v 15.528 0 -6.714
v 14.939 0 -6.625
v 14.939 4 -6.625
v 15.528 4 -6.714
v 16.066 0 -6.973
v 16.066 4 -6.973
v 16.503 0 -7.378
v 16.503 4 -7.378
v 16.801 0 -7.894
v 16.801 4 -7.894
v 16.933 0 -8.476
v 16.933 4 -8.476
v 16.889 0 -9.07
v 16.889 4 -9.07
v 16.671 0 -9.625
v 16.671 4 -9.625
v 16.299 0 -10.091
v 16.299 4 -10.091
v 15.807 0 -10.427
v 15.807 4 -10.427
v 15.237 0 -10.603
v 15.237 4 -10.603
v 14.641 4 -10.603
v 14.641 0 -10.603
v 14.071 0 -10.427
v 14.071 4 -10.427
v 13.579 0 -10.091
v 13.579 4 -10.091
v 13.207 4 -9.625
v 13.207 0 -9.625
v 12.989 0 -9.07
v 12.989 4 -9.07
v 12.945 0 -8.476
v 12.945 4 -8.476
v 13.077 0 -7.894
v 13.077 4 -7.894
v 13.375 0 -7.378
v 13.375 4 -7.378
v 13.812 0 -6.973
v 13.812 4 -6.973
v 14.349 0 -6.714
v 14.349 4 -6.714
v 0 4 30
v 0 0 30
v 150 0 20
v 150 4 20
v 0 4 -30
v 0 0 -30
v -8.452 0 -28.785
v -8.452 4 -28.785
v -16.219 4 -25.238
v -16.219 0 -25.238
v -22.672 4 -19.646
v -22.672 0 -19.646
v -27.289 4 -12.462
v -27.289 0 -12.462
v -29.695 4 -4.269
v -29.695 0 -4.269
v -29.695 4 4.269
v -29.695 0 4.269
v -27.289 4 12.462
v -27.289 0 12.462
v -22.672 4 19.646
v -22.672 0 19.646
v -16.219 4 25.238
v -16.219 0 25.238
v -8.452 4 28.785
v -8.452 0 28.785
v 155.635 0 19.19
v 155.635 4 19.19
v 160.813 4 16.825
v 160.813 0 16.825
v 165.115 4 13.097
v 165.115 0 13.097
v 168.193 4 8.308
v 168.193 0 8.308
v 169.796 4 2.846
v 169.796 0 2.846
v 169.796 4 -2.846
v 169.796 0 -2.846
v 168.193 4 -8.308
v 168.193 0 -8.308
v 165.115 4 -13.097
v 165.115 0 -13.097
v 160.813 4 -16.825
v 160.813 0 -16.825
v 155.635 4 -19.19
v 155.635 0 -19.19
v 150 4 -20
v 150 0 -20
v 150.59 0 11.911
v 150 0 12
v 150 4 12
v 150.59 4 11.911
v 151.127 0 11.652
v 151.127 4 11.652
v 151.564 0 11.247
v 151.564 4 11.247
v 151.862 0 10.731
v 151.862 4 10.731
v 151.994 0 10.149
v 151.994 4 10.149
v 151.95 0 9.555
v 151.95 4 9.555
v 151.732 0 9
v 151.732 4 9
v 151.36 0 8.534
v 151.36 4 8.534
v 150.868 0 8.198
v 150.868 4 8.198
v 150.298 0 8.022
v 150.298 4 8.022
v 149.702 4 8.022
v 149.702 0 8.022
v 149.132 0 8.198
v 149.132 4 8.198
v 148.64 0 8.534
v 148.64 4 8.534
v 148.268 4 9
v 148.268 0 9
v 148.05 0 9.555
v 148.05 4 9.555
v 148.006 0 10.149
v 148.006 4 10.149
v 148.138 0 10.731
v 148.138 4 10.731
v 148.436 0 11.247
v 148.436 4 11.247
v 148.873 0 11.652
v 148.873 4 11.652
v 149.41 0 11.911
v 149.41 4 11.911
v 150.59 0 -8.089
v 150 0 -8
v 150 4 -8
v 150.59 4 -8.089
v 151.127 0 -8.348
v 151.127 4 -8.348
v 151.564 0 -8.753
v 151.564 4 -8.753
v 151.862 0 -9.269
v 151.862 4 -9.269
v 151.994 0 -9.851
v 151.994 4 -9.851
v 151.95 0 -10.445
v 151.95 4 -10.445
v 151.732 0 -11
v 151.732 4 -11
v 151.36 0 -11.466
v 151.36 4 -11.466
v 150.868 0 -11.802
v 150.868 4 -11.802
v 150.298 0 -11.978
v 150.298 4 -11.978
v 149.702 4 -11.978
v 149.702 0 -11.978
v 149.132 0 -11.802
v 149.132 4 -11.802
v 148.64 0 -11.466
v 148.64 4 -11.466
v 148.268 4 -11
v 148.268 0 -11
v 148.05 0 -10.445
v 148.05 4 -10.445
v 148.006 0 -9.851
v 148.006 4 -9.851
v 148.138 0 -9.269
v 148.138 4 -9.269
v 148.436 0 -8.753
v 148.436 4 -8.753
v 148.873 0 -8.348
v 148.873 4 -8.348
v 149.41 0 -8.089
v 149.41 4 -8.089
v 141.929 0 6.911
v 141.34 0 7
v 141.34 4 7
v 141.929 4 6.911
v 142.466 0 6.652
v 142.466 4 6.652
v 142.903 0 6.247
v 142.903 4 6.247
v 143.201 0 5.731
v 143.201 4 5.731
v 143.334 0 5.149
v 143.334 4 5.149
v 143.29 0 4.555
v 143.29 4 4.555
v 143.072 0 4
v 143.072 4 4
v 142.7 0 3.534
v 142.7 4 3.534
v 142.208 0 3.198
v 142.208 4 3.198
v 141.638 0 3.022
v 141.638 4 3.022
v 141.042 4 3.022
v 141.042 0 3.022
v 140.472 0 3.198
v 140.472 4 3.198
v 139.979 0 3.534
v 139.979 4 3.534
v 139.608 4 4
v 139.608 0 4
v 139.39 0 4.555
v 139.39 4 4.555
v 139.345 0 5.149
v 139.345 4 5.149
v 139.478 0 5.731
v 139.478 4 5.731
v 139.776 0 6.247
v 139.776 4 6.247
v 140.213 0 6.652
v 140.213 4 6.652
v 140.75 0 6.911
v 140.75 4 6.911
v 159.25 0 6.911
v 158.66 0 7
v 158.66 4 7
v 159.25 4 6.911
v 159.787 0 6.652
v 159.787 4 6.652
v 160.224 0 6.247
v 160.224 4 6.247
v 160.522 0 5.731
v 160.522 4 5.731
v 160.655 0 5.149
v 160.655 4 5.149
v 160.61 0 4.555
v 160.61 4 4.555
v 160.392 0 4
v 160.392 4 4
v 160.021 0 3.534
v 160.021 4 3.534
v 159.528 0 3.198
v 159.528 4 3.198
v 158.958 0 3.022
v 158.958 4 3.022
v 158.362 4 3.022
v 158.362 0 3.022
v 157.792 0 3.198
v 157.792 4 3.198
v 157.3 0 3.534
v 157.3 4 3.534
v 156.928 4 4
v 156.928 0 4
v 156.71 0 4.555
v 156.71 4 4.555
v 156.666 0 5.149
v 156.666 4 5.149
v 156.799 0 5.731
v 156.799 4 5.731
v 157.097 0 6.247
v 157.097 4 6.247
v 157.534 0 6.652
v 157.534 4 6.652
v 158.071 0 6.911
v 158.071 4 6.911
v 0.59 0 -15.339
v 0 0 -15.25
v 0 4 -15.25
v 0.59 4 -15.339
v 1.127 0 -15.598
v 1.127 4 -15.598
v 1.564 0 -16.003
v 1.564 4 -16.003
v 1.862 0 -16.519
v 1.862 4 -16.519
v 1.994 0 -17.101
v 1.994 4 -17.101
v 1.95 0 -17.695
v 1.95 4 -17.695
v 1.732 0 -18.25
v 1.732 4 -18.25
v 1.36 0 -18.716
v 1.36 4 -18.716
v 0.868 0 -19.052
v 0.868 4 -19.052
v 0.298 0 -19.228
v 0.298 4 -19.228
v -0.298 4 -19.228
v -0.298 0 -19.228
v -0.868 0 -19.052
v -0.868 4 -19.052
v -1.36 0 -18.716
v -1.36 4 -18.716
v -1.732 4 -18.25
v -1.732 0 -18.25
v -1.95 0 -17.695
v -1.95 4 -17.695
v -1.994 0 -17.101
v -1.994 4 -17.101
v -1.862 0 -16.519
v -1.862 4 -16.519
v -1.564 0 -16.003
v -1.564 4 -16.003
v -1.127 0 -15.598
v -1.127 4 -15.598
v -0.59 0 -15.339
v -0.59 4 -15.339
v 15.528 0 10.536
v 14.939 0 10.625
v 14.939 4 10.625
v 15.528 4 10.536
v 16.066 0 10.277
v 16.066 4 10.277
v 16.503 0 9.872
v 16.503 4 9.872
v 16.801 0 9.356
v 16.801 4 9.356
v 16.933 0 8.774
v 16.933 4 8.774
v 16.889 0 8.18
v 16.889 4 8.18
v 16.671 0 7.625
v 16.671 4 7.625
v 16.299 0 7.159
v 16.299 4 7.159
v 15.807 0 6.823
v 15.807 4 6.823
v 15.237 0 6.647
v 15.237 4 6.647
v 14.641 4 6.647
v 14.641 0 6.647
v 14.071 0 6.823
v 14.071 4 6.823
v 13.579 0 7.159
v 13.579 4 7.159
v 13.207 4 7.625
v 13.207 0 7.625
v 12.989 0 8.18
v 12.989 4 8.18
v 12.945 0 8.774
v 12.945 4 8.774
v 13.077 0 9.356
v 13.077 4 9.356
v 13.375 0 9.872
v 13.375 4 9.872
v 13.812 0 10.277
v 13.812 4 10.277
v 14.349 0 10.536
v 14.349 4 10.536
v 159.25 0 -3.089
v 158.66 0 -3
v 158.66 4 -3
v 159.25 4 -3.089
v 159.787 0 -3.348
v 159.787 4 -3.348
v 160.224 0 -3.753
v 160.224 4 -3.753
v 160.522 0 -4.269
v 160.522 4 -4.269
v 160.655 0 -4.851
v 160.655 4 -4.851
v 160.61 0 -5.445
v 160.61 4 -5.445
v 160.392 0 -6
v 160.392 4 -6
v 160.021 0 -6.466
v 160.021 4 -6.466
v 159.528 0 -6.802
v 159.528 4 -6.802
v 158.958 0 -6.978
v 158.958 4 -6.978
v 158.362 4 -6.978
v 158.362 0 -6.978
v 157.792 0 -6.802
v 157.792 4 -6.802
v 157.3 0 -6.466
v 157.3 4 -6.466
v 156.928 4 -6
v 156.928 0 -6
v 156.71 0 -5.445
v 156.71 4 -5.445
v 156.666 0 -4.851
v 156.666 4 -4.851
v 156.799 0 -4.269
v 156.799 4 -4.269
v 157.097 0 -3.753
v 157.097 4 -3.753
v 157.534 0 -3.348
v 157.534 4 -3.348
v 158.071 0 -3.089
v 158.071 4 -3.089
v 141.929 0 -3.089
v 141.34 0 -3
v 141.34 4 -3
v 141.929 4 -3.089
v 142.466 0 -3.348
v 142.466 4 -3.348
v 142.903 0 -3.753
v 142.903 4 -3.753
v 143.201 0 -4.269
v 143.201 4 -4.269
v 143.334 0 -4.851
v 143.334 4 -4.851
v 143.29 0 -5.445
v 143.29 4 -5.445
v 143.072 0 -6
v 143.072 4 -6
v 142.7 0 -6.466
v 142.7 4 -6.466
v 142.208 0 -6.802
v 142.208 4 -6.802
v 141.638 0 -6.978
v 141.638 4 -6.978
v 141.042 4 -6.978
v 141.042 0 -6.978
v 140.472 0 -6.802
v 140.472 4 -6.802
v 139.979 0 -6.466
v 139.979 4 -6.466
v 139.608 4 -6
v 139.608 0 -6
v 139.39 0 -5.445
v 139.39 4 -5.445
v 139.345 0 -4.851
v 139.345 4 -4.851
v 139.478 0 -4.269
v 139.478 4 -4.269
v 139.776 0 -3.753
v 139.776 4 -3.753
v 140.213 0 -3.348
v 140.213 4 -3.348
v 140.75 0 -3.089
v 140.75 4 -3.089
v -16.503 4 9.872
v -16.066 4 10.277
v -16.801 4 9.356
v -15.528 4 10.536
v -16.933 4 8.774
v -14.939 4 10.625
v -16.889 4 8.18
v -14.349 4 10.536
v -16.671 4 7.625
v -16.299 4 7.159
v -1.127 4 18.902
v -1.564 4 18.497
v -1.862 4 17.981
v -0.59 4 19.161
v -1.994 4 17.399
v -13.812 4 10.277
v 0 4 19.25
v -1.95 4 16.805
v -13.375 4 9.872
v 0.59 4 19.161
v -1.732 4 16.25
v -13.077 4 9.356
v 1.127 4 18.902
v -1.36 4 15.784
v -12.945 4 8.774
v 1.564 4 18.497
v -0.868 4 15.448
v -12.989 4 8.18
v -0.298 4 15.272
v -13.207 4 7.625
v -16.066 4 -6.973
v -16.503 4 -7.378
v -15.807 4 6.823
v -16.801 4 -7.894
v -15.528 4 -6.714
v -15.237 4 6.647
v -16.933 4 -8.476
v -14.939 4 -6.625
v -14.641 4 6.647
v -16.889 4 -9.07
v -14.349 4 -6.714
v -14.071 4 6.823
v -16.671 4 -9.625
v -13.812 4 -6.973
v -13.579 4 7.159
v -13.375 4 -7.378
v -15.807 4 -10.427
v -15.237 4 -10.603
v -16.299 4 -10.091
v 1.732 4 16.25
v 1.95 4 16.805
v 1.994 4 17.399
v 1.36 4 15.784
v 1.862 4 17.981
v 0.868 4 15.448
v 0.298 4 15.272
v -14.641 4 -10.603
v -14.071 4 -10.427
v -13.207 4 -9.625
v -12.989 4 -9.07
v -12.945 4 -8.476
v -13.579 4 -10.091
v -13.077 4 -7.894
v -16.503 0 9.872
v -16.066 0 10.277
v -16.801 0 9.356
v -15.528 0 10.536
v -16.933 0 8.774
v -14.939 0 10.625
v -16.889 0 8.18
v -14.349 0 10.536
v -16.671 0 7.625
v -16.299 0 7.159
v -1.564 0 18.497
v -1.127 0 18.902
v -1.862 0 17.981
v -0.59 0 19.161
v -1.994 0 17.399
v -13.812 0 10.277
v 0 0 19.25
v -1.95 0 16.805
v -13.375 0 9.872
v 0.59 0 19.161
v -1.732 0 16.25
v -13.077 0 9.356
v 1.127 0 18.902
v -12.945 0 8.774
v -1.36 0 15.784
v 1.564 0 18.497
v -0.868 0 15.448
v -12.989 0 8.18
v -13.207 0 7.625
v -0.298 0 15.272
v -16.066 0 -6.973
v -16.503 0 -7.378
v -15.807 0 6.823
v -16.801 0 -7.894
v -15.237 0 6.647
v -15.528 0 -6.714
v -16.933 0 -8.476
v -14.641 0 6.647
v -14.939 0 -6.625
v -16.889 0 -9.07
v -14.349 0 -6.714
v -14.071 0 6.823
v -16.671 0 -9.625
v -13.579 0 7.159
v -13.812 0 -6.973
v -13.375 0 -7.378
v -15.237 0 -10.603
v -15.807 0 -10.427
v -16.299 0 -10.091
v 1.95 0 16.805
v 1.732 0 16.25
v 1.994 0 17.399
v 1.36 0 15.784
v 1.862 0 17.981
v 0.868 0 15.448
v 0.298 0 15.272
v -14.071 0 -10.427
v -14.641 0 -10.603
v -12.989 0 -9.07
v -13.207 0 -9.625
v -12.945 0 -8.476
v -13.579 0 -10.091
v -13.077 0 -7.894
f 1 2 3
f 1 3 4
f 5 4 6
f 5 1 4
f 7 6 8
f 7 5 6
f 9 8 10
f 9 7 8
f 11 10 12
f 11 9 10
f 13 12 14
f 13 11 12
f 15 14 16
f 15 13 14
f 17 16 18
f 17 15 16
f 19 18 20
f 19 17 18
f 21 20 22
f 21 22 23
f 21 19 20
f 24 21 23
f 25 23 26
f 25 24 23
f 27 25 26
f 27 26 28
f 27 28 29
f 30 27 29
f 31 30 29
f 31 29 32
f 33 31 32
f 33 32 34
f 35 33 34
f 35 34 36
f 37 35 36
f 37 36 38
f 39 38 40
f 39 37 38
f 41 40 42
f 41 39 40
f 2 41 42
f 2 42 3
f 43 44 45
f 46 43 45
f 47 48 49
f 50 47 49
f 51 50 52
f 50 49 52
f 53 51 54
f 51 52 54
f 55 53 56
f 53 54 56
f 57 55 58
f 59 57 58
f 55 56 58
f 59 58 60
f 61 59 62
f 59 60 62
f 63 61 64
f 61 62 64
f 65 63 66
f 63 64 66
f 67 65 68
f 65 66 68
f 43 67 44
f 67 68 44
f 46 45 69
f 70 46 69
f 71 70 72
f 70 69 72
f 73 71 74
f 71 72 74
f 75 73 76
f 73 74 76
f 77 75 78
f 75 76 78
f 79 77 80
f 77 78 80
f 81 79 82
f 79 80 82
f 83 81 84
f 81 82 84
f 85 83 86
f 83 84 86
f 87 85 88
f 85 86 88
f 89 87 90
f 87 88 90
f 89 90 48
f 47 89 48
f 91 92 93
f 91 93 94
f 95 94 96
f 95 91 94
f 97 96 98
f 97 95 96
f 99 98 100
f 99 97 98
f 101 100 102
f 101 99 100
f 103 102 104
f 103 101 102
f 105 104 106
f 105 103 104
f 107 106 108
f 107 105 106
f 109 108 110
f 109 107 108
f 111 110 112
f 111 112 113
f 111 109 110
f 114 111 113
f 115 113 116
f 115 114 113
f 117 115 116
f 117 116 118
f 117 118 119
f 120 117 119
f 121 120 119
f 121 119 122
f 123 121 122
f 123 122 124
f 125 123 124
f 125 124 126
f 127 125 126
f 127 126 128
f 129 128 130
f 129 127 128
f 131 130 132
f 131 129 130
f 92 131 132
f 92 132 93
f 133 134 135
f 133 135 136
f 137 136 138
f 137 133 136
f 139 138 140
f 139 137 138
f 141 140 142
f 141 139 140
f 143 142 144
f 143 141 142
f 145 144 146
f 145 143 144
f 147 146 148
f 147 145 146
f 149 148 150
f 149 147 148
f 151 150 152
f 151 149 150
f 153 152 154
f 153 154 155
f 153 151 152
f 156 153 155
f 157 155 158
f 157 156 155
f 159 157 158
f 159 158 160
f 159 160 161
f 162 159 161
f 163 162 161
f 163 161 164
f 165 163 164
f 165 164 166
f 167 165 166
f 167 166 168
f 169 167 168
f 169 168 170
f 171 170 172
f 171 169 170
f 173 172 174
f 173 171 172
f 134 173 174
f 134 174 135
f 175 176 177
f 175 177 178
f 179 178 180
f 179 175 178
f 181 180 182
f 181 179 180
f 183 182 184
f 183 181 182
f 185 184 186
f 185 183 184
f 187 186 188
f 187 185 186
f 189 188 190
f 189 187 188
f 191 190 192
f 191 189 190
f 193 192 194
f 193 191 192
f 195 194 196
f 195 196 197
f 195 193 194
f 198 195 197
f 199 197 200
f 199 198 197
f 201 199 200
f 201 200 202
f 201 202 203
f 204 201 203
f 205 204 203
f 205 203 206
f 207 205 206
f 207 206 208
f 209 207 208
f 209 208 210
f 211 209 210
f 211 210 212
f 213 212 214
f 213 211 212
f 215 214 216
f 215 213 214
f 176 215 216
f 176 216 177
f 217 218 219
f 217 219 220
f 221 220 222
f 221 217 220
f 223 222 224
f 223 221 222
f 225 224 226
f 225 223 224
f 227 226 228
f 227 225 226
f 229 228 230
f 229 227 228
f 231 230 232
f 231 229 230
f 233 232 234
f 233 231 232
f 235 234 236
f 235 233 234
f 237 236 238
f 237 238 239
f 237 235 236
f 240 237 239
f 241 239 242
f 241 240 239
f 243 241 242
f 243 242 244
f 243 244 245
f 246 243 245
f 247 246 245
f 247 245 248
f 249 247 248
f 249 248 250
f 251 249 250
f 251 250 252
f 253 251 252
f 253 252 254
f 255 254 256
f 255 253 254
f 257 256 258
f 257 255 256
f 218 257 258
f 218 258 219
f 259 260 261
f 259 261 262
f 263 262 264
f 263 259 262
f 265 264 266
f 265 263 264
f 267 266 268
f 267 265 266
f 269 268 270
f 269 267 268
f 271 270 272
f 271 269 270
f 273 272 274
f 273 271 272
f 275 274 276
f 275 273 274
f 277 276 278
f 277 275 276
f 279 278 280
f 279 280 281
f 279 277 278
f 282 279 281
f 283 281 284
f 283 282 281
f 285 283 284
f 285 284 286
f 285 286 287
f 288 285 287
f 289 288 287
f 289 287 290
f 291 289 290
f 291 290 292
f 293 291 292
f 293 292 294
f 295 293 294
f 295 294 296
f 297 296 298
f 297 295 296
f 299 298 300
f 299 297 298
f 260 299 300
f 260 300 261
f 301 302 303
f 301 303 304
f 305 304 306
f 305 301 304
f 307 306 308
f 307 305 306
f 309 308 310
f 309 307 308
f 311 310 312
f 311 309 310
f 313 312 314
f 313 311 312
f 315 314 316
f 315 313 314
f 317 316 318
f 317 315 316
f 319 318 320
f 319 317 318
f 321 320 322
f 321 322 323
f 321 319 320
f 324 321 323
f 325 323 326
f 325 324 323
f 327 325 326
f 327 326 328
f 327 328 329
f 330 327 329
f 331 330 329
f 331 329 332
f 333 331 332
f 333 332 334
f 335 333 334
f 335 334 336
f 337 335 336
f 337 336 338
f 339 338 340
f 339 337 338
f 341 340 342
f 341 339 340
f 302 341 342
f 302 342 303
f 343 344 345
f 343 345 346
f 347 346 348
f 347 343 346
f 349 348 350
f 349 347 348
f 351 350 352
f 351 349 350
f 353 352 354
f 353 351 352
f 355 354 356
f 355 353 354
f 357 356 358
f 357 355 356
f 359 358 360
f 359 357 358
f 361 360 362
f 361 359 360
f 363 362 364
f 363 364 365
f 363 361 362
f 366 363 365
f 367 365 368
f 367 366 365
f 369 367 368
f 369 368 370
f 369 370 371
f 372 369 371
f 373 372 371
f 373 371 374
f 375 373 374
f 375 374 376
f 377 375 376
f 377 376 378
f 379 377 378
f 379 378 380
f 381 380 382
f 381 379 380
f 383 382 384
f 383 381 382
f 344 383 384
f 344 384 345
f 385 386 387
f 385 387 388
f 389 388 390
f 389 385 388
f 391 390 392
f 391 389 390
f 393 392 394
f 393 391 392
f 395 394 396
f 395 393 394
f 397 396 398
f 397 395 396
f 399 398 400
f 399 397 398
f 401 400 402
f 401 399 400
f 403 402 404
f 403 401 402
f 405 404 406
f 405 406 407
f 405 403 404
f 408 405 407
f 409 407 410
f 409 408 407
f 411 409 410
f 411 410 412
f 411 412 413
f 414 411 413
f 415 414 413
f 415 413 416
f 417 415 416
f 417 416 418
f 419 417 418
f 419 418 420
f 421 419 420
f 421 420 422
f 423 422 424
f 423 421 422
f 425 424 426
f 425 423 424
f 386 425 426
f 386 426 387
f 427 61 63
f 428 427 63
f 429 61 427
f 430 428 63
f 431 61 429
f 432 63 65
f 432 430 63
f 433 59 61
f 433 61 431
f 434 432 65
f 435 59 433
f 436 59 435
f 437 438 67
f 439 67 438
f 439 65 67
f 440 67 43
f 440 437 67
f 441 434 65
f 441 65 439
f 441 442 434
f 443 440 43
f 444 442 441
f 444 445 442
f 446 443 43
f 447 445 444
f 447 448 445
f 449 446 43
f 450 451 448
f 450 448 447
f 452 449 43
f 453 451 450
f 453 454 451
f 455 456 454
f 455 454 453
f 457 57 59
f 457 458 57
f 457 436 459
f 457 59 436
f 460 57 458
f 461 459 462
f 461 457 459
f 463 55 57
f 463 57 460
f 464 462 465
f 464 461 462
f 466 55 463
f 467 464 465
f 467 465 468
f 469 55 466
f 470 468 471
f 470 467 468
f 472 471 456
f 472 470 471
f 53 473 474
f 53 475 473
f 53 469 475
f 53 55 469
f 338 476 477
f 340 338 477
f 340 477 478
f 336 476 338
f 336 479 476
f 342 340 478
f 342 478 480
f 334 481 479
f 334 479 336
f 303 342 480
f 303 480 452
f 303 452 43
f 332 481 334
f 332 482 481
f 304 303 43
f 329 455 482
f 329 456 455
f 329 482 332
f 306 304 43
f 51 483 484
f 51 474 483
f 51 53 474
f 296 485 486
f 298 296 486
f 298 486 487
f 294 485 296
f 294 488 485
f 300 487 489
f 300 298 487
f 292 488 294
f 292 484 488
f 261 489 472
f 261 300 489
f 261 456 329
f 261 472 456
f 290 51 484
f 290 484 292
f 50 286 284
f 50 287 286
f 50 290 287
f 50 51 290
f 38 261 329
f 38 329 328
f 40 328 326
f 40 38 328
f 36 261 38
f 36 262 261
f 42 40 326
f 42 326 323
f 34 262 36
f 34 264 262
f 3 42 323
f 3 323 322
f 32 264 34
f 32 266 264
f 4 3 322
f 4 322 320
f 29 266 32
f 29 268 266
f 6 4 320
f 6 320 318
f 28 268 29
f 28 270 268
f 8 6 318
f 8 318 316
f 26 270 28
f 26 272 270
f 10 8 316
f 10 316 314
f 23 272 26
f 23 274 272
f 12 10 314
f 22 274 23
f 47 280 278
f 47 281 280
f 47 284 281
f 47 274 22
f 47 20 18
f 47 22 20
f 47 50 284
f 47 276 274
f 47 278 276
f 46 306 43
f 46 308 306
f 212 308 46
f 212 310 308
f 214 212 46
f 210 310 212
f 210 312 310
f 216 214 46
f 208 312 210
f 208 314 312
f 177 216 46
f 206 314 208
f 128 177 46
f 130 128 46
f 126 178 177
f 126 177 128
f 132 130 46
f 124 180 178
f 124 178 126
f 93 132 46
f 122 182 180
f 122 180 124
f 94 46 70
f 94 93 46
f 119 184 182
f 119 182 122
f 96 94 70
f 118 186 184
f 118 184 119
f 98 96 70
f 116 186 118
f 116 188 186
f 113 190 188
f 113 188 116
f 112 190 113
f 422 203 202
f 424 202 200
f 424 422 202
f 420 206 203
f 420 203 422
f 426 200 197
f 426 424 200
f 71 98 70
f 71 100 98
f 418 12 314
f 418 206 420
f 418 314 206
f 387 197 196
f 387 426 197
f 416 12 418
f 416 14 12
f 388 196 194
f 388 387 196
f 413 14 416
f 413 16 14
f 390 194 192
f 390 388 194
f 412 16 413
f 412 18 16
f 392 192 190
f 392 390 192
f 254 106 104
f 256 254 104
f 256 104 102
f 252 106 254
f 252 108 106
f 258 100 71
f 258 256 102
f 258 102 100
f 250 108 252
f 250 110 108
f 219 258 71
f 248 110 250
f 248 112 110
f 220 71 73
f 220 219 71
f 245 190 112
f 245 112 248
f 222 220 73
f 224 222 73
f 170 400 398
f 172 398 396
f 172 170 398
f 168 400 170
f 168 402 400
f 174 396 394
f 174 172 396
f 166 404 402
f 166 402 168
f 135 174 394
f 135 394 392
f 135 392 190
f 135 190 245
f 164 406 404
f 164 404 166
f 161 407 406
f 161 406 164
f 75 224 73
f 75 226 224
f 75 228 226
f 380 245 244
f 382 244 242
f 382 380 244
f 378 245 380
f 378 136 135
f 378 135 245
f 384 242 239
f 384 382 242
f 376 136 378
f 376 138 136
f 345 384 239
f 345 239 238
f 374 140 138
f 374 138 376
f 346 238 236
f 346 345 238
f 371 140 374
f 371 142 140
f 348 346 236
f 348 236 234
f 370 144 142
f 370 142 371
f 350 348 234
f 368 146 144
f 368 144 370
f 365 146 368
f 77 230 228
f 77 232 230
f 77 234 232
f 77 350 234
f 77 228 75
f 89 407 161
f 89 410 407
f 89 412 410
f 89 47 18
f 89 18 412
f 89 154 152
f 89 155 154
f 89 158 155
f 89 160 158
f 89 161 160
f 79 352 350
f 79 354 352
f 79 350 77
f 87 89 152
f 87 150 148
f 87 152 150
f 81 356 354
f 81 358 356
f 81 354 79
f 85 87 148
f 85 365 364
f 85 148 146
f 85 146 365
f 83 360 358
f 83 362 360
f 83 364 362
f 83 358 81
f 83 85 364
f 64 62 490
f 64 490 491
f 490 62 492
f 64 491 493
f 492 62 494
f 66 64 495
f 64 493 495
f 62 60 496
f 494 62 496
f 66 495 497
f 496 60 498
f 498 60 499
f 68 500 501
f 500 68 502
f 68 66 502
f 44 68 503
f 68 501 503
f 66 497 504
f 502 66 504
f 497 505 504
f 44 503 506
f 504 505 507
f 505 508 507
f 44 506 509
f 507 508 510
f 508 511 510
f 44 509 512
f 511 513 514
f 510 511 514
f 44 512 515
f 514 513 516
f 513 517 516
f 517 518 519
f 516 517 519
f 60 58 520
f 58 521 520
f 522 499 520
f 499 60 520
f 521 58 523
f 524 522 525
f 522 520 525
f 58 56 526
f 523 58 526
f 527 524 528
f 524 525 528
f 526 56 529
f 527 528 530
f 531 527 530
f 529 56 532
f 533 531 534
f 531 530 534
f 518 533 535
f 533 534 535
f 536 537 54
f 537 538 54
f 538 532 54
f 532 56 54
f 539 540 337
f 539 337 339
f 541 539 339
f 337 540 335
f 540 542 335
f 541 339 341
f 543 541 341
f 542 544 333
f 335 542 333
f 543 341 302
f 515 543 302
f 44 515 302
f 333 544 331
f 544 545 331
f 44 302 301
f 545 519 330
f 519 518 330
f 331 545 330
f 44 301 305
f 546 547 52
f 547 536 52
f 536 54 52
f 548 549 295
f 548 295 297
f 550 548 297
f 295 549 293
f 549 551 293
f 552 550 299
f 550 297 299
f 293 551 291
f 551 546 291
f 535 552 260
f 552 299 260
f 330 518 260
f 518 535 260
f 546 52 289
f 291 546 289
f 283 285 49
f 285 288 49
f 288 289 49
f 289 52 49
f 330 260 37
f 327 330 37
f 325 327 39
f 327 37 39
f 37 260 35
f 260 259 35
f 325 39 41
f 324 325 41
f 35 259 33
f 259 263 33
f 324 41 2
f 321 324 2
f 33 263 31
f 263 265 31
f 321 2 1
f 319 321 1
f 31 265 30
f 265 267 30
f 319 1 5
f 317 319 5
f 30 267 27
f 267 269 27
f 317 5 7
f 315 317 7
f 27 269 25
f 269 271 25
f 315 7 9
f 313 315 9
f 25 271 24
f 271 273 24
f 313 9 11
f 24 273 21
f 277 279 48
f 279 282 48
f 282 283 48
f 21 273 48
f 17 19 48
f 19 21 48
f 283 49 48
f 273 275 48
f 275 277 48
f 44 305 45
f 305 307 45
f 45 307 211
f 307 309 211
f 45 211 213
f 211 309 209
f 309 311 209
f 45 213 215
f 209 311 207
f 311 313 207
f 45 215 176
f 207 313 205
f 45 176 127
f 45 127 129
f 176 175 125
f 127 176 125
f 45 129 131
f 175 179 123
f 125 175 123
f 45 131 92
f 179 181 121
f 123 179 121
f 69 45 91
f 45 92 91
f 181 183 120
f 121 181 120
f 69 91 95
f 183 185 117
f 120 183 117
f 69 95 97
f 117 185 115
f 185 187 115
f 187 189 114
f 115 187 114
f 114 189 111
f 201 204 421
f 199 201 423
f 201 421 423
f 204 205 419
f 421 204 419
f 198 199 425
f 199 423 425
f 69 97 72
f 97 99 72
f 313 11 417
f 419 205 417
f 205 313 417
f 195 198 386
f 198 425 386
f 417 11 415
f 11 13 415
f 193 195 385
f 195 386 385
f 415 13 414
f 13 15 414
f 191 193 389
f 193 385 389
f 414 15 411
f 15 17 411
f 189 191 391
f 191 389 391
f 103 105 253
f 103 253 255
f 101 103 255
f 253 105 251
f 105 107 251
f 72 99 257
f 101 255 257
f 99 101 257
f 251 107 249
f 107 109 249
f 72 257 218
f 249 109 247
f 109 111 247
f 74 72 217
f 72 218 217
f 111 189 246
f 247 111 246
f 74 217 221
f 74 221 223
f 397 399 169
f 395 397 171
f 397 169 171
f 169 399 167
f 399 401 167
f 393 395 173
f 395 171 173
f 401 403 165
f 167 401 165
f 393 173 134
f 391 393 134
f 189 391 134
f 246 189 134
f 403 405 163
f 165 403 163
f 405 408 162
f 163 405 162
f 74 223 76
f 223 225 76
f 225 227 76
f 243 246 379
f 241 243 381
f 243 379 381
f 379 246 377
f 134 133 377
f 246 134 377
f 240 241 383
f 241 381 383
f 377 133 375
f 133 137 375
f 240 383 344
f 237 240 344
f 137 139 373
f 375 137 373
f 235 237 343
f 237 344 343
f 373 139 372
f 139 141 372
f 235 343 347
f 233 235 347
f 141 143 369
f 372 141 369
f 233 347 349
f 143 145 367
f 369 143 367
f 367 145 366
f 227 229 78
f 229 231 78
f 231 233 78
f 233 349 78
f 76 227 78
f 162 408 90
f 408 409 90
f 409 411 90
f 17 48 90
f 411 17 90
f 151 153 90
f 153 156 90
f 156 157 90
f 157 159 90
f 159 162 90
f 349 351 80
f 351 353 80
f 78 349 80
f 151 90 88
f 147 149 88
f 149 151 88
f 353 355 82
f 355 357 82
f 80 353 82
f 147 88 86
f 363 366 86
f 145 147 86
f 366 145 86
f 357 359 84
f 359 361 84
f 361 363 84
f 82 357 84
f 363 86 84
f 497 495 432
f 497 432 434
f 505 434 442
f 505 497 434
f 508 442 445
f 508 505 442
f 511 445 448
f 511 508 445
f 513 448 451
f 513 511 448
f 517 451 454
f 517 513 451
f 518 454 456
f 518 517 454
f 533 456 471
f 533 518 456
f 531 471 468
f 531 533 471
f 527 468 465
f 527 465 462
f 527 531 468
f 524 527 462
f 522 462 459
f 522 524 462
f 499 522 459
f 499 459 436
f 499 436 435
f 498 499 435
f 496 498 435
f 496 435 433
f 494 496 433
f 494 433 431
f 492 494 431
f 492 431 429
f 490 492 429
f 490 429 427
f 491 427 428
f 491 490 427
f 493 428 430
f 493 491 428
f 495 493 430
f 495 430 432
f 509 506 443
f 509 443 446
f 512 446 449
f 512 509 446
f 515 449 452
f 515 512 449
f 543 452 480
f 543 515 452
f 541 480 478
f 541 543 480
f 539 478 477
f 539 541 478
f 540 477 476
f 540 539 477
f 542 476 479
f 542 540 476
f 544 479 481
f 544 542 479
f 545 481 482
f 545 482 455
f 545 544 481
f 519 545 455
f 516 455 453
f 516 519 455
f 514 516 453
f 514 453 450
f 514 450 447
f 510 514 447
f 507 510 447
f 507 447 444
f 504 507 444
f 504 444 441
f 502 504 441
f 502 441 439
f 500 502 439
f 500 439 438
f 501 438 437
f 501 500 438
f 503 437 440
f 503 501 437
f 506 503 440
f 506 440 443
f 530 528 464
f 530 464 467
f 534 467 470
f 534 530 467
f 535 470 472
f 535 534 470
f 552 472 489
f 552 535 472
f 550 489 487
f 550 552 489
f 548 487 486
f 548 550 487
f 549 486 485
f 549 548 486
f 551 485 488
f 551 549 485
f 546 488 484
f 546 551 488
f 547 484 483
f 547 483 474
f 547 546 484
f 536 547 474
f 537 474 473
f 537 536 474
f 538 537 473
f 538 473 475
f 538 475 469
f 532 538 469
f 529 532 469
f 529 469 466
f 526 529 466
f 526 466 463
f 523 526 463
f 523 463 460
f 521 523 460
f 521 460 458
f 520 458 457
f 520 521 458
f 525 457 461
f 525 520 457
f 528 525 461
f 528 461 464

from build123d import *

# Parameters (mm, degrees)
SKETCH_1_R      = 2
EXTRUDE_2_DEPTH = 4


with BuildPart() as part:
    # 草图1 → 凸台-拉伸2 (new body)
    with BuildSketch(Plane(origin=(0, 0, 0), x_dir=(1, 0, 0), z_dir=(0, 1, 0))):
        with BuildLine():
            Line((0, -30), (150, -20))
            ThreePointArc((150, -20), (170, 0), (150, 20))
            Line((150, 20), (0, 30))
            ThreePointArc((0, 30), (-30, 0), (0, -30))
        make_face()
        with Locations(Location((0, -17.25, 0), (0, 0, 270))):
            Circle(SKETCH_1_R, mode=Mode.SUBTRACT)
        with Locations(Location((-14.938938215, -8.625, 0), (0, 0, 270))):
            Circle(SKETCH_1_R, mode=Mode.SUBTRACT)
        with Locations(Location((14.938938215, -8.625, 0), (0, 0, 270))):
            Circle(SKETCH_1_R, mode=Mode.SUBTRACT)
        with Locations(Location((-14.938938215, 8.625, 0), (0, 0, 270))):
            Circle(SKETCH_1_R, mode=Mode.SUBTRACT)
        with Locations(Location((14.938938215, 8.625, 0), (0, 0, 270))):
            Circle(SKETCH_1_R, mode=Mode.SUBTRACT)
        with Locations(Location((0, 17.25, 0), (0, 0, 270))):
            Circle(SKETCH_1_R, mode=Mode.SUBTRACT)
        with Locations(Location((141.339745962, -5, 0), (0, 0, 270))):
            Circle(SKETCH_1_R, mode=Mode.SUBTRACT)
        with Locations(Location((150, -10, 0), (0, 0, 270))):
            Circle(SKETCH_1_R, mode=Mode.SUBTRACT)
        with Locations(Location((158.660254038, -5, 0), (0, 0, 270))):
            Circle(SKETCH_1_R, mode=Mode.SUBTRACT)
        with Locations(Location((158.660254038, 5, 0), (0, 0, 270))):
            Circle(SKETCH_1_R, mode=Mode.SUBTRACT)
        with Locations(Location((150, 10, 0), (0, 0, 270))):
            Circle(SKETCH_1_R, mode=Mode.SUBTRACT)
        with Locations(Location((141.339745962, 5, 0), (0, 0, 270))):
            Circle(SKETCH_1_R, mode=Mode.SUBTRACT)
    extrude(amount=EXTRUDE_2_DEPTH)


solid = part.part
